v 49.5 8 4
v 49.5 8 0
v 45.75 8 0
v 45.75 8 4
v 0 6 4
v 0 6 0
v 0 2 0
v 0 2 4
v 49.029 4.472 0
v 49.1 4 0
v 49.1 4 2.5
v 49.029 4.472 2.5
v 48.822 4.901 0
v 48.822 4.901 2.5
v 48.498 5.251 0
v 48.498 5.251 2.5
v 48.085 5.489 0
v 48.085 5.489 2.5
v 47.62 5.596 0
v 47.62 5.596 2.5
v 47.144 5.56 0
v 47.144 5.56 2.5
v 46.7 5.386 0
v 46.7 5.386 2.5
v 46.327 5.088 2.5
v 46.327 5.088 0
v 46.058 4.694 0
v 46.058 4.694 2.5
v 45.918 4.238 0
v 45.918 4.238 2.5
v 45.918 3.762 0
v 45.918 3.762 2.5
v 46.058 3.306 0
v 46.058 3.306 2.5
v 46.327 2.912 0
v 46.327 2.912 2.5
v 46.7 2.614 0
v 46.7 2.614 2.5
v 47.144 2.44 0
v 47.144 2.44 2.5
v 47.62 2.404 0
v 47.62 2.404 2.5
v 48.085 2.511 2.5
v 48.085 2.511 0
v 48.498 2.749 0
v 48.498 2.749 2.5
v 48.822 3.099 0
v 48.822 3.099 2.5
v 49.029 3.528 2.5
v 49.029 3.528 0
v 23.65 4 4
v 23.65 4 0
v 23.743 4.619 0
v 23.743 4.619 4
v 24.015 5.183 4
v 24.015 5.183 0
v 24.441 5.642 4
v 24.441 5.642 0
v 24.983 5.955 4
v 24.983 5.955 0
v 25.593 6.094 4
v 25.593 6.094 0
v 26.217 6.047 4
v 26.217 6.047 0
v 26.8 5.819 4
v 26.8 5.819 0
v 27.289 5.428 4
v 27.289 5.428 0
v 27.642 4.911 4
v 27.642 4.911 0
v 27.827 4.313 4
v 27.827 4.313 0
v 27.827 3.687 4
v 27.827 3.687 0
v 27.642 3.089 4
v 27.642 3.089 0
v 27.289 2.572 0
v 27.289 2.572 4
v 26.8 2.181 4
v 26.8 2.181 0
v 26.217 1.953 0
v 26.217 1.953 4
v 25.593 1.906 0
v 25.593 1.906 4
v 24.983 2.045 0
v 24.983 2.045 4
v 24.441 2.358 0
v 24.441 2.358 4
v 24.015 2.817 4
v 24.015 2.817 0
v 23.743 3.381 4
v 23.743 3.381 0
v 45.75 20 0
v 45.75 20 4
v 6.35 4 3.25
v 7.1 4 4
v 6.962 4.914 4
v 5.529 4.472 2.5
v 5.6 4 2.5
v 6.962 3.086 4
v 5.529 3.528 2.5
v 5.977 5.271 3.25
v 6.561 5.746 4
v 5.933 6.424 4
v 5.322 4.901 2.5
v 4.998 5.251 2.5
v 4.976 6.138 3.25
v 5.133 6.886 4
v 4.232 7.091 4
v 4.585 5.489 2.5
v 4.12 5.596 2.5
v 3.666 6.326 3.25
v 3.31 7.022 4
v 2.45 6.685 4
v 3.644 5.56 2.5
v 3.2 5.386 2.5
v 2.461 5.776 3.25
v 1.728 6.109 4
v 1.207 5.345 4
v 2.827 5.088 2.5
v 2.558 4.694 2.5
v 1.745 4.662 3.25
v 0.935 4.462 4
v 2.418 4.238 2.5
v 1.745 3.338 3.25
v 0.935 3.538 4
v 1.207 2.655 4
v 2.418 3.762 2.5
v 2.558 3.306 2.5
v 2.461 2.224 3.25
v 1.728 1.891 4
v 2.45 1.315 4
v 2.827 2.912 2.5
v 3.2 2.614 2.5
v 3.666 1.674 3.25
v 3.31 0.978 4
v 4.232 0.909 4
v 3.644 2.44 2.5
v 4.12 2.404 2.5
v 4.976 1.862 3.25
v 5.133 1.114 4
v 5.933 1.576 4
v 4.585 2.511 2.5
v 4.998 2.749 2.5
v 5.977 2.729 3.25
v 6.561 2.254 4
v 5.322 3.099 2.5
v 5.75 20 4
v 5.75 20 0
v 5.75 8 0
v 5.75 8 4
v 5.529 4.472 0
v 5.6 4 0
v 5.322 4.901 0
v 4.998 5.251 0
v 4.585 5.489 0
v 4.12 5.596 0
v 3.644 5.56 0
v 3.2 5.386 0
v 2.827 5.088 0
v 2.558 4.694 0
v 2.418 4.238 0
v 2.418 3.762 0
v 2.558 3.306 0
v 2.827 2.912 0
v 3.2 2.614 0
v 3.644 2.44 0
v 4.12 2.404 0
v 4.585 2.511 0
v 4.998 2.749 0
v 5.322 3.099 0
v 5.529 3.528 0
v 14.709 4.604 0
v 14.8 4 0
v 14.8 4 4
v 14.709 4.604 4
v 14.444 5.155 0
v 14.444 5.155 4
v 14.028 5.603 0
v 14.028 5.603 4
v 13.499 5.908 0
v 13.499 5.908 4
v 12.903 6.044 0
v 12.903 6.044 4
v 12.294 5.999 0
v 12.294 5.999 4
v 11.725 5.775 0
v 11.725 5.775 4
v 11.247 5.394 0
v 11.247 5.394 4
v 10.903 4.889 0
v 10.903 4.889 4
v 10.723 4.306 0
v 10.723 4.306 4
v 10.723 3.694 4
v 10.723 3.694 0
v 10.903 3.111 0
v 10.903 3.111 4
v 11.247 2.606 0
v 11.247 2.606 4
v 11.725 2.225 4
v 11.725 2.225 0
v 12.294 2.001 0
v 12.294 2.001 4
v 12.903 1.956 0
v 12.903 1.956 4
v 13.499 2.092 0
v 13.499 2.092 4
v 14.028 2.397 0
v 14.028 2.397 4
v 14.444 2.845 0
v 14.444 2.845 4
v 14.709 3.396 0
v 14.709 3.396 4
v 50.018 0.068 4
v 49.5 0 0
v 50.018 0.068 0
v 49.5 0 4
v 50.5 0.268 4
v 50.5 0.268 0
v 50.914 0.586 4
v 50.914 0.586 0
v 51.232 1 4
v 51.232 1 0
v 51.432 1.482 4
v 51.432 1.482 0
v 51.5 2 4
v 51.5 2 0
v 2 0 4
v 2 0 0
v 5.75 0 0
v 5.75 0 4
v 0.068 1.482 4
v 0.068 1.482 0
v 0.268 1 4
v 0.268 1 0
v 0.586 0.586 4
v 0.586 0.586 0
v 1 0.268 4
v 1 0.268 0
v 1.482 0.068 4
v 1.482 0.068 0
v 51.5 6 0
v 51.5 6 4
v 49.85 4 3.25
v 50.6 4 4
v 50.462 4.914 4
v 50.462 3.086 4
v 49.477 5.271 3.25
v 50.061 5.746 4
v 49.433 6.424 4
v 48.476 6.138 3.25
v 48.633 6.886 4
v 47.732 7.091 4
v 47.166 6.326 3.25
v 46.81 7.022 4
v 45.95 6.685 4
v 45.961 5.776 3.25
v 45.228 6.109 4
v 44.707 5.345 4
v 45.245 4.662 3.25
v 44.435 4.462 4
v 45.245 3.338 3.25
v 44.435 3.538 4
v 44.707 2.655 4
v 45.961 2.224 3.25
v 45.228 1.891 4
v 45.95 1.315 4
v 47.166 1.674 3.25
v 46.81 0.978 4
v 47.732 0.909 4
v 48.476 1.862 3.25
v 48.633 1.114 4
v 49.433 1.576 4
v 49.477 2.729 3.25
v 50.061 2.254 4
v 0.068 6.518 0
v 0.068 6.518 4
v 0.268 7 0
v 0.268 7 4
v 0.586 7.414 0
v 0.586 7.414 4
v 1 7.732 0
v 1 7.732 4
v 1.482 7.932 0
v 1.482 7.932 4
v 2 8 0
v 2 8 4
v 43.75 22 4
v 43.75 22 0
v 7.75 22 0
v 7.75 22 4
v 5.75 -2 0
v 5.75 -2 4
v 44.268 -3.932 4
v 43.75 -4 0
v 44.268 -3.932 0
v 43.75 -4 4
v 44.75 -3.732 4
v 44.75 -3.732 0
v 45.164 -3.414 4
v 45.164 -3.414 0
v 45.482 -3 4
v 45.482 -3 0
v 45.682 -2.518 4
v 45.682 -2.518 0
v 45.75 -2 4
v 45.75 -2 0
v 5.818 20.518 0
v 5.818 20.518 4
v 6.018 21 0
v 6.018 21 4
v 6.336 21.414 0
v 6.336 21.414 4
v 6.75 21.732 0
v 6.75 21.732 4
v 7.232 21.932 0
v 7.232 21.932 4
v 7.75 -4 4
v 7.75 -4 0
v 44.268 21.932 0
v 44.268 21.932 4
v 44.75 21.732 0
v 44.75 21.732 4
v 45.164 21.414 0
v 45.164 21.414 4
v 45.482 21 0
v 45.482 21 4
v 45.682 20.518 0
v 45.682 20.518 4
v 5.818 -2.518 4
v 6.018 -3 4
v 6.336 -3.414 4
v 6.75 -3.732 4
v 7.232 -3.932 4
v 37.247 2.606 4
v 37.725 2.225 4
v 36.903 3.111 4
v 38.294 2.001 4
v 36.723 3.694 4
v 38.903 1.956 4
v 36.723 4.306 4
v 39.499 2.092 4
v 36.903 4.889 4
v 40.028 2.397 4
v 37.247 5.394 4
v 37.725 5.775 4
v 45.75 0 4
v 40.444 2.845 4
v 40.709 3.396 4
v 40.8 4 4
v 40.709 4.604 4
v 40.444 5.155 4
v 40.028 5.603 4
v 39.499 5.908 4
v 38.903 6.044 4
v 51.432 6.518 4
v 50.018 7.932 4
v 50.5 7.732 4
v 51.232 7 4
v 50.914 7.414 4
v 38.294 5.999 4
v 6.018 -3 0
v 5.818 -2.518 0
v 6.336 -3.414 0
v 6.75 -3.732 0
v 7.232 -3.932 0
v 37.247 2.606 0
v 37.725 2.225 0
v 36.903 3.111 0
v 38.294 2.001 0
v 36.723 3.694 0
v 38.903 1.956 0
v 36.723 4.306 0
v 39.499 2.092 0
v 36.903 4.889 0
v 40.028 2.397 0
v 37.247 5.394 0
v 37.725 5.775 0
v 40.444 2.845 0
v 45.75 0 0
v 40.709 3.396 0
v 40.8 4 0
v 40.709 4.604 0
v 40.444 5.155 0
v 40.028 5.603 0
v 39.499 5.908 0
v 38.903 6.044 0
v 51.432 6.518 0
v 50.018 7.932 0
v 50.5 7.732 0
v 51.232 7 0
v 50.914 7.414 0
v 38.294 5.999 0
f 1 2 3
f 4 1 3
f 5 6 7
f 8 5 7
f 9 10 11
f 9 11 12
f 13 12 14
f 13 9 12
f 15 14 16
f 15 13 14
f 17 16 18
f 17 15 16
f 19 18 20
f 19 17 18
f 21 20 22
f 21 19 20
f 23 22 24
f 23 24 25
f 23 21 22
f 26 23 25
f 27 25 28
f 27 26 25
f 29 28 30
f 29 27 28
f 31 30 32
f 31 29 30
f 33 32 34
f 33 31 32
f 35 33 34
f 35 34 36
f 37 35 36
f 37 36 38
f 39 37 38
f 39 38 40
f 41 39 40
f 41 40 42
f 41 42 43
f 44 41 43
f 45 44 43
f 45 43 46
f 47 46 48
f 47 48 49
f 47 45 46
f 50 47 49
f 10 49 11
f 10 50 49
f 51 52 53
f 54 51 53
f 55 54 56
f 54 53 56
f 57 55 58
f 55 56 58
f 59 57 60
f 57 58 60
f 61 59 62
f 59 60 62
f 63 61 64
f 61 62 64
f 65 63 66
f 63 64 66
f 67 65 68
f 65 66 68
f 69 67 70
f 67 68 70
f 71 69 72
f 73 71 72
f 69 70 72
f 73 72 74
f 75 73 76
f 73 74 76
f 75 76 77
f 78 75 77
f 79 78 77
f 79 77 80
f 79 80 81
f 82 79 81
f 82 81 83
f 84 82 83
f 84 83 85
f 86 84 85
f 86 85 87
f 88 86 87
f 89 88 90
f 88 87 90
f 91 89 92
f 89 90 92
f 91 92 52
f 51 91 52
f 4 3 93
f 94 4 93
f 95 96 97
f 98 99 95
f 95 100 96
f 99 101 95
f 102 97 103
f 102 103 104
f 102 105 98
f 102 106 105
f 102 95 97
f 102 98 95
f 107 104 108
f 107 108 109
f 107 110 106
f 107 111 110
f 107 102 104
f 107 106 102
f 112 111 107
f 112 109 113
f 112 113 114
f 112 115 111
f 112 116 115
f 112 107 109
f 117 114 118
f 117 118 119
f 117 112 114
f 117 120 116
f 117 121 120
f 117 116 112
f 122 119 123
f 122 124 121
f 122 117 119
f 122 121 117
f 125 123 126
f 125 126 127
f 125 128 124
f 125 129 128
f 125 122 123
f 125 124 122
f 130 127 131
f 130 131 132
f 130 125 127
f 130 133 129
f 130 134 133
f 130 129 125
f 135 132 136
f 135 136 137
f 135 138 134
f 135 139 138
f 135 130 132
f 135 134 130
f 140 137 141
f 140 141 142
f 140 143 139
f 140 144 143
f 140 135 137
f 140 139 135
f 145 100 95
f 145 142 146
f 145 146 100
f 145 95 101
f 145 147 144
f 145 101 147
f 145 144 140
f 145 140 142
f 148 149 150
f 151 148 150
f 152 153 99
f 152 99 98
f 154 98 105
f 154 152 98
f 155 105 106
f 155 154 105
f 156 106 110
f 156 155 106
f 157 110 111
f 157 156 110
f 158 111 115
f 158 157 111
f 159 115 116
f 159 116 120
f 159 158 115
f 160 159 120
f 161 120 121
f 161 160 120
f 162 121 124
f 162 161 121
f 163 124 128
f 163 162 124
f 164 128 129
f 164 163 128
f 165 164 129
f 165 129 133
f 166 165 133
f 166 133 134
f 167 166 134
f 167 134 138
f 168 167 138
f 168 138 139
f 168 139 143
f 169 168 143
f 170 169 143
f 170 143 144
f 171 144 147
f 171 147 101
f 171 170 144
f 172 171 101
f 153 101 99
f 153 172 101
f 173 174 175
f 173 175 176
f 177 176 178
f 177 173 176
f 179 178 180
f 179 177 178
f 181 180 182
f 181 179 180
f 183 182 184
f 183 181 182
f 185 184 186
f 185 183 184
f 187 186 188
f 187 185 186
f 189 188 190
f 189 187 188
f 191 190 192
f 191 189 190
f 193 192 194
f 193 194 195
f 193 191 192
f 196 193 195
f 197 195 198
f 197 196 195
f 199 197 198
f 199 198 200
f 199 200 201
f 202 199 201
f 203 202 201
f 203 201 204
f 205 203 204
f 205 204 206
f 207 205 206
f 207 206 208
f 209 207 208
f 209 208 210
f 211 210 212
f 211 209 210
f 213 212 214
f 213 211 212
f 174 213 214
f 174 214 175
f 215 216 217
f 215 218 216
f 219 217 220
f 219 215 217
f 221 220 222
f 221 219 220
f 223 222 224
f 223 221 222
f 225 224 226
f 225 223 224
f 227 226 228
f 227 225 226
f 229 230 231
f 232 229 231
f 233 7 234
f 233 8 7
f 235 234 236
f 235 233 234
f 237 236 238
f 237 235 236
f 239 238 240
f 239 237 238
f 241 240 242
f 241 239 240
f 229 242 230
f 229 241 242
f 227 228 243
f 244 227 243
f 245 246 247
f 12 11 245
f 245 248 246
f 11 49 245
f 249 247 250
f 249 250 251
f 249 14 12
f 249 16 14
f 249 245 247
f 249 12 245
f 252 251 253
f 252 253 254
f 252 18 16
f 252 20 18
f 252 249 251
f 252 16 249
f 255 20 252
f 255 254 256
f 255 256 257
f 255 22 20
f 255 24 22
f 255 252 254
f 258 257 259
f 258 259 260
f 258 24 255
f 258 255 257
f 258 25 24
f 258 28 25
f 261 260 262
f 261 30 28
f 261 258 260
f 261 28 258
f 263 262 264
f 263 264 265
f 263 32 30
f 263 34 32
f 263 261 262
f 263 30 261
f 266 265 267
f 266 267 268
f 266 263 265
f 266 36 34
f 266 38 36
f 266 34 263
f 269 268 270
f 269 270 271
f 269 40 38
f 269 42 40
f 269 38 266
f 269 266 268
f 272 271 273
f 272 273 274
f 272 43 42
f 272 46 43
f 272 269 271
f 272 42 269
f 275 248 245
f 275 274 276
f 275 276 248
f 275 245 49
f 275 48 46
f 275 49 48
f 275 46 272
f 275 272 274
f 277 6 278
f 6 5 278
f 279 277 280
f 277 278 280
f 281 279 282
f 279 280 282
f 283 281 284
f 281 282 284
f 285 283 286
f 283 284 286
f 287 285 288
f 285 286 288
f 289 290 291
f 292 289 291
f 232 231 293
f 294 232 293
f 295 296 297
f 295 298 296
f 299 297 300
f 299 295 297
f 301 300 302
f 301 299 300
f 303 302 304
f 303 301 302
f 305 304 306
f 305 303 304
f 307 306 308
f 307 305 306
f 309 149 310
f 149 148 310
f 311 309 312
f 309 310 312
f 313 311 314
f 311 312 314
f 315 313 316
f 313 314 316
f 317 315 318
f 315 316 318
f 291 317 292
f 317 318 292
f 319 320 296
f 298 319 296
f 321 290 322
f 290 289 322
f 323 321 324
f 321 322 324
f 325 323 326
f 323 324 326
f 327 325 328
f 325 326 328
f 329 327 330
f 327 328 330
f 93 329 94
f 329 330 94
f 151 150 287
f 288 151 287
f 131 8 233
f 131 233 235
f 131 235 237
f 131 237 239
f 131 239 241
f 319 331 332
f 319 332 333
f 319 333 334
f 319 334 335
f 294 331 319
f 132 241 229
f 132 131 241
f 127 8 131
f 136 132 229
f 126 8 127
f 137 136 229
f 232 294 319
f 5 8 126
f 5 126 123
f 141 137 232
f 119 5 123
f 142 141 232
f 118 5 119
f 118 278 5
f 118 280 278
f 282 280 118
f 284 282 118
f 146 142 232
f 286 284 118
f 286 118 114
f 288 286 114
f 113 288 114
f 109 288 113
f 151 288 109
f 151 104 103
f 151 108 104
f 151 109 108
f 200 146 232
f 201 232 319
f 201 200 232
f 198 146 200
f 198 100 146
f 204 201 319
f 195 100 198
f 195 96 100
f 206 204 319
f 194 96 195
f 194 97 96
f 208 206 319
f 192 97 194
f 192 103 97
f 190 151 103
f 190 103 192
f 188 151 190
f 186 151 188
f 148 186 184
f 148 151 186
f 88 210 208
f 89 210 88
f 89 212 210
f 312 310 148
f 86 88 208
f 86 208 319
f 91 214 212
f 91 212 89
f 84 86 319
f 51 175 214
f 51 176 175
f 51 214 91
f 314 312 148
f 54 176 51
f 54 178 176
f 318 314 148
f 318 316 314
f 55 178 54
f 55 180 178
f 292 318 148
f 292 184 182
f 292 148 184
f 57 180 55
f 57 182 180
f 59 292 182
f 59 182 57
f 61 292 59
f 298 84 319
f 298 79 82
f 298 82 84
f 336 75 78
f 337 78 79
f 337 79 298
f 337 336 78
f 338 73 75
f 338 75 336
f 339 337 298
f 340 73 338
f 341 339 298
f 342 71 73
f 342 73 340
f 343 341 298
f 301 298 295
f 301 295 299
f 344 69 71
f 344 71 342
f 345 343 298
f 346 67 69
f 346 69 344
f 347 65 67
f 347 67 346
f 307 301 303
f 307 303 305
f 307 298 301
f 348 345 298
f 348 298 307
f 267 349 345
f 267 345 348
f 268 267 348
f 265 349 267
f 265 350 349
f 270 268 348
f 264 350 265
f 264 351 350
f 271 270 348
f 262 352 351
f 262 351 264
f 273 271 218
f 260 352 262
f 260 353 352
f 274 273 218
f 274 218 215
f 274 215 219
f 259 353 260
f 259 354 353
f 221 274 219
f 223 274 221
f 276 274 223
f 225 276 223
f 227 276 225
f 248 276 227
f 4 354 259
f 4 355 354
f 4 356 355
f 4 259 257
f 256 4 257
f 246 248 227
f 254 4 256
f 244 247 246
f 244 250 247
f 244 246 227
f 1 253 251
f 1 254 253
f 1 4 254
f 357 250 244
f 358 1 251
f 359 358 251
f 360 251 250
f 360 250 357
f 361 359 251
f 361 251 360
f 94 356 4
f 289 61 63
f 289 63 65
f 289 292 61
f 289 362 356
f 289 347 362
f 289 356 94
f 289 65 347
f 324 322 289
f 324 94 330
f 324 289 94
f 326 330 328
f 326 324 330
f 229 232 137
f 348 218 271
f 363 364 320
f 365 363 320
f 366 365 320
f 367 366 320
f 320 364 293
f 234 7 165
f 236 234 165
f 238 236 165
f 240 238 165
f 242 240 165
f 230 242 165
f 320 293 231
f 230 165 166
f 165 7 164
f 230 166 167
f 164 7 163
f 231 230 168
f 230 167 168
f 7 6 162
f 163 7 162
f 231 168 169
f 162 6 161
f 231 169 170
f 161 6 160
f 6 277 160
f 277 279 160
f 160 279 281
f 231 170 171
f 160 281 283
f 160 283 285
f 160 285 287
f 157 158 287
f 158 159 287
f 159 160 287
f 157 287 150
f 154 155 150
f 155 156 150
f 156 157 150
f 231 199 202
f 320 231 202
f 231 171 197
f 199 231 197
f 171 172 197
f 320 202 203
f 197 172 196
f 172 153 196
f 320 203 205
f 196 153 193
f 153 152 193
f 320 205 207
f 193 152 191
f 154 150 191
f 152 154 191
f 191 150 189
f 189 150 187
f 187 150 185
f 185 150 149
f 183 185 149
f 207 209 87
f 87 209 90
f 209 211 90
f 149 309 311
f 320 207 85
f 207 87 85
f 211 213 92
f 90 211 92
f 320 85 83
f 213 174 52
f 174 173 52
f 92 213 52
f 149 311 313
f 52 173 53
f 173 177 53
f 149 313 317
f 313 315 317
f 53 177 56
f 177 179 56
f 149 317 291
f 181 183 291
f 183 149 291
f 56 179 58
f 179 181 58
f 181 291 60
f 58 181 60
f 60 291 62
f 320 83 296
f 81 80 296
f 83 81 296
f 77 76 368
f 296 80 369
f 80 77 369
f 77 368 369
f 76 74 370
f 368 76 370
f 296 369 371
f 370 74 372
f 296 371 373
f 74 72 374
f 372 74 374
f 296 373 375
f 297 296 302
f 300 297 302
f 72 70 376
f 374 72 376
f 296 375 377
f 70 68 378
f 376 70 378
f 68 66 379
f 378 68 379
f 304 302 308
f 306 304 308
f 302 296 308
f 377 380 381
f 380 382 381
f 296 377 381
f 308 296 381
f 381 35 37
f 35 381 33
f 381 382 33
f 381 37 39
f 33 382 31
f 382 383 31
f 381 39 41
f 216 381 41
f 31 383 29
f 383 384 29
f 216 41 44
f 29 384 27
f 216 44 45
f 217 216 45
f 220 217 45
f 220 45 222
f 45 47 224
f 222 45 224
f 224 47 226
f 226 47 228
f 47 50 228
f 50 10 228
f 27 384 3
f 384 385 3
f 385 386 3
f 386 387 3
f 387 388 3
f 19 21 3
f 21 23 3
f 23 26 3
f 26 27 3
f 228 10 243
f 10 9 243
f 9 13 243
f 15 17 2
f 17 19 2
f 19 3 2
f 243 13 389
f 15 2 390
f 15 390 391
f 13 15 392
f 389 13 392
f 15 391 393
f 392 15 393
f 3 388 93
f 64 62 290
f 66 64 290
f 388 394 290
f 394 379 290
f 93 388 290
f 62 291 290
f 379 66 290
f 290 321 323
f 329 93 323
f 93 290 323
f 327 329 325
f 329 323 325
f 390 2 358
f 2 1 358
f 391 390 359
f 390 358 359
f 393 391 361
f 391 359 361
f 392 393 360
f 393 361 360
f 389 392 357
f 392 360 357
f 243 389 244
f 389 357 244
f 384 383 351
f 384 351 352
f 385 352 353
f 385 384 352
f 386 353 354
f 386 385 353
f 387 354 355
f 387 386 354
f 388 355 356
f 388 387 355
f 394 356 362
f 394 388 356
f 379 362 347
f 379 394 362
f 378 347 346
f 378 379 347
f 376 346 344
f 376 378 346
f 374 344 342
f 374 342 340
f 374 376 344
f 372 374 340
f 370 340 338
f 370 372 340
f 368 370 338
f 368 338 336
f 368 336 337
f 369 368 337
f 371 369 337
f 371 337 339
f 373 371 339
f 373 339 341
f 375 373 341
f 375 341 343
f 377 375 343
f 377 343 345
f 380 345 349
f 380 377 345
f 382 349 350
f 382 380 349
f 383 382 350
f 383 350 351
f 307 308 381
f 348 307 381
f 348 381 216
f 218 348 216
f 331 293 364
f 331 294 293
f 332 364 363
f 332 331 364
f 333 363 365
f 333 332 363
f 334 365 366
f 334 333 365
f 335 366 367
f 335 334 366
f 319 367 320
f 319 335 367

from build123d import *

# Parameters (mm, degrees)
SKETCH_1_R      = 2.05
SKETCH_1_R_2    = 1.6
EXTRUDE_1_DEPTH = 4
FILLET_1_R      = 2
CHAMFER_1_SIZE  = 1.5
FILLET_2_R      = 2


with BuildPart() as part:
    # Эскиз1 → Бобышка-Вытянуть1 (new body)
    with BuildSketch(Plane.XY):
        Polygon((0, 8), (0, 0), (5.75, 0), (5.75, -4), (45.75, -4), (45.75, 0), (51.5, 0), (51.5, 8), (45.75, 8), (45.75, 22), (5.75, 22), (5.75, 8), align=None)
        with Locations((12.75, 4)):
            Circle(SKETCH_1_R, mode=Mode.SUBTRACT)
        with Locations((4, 4)):
            Circle(SKETCH_1_R_2, mode=Mode.SUBTRACT)
        with BuildLine():
            ThreePointArc((27.85, 4), (25.75, 1.9), (23.65, 4))
            ThreePointArc((23.65, 4), (25.75, 6.1), (27.85, 4))
        make_face(mode=Mode.SUBTRACT)
        with Locations((38.75, 4)):
            Circle(SKETCH_1_R, mode=Mode.SUBTRACT)
        with Locations((47.5, 4)):
            Circle(SKETCH_1_R_2, mode=Mode.SUBTRACT)
    extrude(amount=EXTRUDE_1_DEPTH)

    # Скругление1
    fillet_1_edges = [part.edges().sort_by_distance(p)[0] for p in [
        (0, 0, 2),
        (0, 8, 2),
        (51.5, 8, 2),
        (51.5, 0, 2),
    ]]
    fillet(fillet_1_edges, radius=FILLET_1_R)

    # Фаска1
    chamfer_1_edges = [part.edges().sort_by_distance(p)[0] for p in [
        (2.4, 4, 4),
        (45.9, 4, 4),
    ]]
    chamfer(chamfer_1_edges, length=CHAMFER_1_SIZE)

    # Скругление2
    fillet_2_edges = [part.edges().sort_by_distance(p)[0] for p in [
        (5.75, 22, 2),
        (45.75, 22, 2),
        (45.75, -4, 2),
        (5.75, -4, 2),
    ]]
    fillet(fillet_2_edges, radius=FILLET_2_R)


solid = part.part
